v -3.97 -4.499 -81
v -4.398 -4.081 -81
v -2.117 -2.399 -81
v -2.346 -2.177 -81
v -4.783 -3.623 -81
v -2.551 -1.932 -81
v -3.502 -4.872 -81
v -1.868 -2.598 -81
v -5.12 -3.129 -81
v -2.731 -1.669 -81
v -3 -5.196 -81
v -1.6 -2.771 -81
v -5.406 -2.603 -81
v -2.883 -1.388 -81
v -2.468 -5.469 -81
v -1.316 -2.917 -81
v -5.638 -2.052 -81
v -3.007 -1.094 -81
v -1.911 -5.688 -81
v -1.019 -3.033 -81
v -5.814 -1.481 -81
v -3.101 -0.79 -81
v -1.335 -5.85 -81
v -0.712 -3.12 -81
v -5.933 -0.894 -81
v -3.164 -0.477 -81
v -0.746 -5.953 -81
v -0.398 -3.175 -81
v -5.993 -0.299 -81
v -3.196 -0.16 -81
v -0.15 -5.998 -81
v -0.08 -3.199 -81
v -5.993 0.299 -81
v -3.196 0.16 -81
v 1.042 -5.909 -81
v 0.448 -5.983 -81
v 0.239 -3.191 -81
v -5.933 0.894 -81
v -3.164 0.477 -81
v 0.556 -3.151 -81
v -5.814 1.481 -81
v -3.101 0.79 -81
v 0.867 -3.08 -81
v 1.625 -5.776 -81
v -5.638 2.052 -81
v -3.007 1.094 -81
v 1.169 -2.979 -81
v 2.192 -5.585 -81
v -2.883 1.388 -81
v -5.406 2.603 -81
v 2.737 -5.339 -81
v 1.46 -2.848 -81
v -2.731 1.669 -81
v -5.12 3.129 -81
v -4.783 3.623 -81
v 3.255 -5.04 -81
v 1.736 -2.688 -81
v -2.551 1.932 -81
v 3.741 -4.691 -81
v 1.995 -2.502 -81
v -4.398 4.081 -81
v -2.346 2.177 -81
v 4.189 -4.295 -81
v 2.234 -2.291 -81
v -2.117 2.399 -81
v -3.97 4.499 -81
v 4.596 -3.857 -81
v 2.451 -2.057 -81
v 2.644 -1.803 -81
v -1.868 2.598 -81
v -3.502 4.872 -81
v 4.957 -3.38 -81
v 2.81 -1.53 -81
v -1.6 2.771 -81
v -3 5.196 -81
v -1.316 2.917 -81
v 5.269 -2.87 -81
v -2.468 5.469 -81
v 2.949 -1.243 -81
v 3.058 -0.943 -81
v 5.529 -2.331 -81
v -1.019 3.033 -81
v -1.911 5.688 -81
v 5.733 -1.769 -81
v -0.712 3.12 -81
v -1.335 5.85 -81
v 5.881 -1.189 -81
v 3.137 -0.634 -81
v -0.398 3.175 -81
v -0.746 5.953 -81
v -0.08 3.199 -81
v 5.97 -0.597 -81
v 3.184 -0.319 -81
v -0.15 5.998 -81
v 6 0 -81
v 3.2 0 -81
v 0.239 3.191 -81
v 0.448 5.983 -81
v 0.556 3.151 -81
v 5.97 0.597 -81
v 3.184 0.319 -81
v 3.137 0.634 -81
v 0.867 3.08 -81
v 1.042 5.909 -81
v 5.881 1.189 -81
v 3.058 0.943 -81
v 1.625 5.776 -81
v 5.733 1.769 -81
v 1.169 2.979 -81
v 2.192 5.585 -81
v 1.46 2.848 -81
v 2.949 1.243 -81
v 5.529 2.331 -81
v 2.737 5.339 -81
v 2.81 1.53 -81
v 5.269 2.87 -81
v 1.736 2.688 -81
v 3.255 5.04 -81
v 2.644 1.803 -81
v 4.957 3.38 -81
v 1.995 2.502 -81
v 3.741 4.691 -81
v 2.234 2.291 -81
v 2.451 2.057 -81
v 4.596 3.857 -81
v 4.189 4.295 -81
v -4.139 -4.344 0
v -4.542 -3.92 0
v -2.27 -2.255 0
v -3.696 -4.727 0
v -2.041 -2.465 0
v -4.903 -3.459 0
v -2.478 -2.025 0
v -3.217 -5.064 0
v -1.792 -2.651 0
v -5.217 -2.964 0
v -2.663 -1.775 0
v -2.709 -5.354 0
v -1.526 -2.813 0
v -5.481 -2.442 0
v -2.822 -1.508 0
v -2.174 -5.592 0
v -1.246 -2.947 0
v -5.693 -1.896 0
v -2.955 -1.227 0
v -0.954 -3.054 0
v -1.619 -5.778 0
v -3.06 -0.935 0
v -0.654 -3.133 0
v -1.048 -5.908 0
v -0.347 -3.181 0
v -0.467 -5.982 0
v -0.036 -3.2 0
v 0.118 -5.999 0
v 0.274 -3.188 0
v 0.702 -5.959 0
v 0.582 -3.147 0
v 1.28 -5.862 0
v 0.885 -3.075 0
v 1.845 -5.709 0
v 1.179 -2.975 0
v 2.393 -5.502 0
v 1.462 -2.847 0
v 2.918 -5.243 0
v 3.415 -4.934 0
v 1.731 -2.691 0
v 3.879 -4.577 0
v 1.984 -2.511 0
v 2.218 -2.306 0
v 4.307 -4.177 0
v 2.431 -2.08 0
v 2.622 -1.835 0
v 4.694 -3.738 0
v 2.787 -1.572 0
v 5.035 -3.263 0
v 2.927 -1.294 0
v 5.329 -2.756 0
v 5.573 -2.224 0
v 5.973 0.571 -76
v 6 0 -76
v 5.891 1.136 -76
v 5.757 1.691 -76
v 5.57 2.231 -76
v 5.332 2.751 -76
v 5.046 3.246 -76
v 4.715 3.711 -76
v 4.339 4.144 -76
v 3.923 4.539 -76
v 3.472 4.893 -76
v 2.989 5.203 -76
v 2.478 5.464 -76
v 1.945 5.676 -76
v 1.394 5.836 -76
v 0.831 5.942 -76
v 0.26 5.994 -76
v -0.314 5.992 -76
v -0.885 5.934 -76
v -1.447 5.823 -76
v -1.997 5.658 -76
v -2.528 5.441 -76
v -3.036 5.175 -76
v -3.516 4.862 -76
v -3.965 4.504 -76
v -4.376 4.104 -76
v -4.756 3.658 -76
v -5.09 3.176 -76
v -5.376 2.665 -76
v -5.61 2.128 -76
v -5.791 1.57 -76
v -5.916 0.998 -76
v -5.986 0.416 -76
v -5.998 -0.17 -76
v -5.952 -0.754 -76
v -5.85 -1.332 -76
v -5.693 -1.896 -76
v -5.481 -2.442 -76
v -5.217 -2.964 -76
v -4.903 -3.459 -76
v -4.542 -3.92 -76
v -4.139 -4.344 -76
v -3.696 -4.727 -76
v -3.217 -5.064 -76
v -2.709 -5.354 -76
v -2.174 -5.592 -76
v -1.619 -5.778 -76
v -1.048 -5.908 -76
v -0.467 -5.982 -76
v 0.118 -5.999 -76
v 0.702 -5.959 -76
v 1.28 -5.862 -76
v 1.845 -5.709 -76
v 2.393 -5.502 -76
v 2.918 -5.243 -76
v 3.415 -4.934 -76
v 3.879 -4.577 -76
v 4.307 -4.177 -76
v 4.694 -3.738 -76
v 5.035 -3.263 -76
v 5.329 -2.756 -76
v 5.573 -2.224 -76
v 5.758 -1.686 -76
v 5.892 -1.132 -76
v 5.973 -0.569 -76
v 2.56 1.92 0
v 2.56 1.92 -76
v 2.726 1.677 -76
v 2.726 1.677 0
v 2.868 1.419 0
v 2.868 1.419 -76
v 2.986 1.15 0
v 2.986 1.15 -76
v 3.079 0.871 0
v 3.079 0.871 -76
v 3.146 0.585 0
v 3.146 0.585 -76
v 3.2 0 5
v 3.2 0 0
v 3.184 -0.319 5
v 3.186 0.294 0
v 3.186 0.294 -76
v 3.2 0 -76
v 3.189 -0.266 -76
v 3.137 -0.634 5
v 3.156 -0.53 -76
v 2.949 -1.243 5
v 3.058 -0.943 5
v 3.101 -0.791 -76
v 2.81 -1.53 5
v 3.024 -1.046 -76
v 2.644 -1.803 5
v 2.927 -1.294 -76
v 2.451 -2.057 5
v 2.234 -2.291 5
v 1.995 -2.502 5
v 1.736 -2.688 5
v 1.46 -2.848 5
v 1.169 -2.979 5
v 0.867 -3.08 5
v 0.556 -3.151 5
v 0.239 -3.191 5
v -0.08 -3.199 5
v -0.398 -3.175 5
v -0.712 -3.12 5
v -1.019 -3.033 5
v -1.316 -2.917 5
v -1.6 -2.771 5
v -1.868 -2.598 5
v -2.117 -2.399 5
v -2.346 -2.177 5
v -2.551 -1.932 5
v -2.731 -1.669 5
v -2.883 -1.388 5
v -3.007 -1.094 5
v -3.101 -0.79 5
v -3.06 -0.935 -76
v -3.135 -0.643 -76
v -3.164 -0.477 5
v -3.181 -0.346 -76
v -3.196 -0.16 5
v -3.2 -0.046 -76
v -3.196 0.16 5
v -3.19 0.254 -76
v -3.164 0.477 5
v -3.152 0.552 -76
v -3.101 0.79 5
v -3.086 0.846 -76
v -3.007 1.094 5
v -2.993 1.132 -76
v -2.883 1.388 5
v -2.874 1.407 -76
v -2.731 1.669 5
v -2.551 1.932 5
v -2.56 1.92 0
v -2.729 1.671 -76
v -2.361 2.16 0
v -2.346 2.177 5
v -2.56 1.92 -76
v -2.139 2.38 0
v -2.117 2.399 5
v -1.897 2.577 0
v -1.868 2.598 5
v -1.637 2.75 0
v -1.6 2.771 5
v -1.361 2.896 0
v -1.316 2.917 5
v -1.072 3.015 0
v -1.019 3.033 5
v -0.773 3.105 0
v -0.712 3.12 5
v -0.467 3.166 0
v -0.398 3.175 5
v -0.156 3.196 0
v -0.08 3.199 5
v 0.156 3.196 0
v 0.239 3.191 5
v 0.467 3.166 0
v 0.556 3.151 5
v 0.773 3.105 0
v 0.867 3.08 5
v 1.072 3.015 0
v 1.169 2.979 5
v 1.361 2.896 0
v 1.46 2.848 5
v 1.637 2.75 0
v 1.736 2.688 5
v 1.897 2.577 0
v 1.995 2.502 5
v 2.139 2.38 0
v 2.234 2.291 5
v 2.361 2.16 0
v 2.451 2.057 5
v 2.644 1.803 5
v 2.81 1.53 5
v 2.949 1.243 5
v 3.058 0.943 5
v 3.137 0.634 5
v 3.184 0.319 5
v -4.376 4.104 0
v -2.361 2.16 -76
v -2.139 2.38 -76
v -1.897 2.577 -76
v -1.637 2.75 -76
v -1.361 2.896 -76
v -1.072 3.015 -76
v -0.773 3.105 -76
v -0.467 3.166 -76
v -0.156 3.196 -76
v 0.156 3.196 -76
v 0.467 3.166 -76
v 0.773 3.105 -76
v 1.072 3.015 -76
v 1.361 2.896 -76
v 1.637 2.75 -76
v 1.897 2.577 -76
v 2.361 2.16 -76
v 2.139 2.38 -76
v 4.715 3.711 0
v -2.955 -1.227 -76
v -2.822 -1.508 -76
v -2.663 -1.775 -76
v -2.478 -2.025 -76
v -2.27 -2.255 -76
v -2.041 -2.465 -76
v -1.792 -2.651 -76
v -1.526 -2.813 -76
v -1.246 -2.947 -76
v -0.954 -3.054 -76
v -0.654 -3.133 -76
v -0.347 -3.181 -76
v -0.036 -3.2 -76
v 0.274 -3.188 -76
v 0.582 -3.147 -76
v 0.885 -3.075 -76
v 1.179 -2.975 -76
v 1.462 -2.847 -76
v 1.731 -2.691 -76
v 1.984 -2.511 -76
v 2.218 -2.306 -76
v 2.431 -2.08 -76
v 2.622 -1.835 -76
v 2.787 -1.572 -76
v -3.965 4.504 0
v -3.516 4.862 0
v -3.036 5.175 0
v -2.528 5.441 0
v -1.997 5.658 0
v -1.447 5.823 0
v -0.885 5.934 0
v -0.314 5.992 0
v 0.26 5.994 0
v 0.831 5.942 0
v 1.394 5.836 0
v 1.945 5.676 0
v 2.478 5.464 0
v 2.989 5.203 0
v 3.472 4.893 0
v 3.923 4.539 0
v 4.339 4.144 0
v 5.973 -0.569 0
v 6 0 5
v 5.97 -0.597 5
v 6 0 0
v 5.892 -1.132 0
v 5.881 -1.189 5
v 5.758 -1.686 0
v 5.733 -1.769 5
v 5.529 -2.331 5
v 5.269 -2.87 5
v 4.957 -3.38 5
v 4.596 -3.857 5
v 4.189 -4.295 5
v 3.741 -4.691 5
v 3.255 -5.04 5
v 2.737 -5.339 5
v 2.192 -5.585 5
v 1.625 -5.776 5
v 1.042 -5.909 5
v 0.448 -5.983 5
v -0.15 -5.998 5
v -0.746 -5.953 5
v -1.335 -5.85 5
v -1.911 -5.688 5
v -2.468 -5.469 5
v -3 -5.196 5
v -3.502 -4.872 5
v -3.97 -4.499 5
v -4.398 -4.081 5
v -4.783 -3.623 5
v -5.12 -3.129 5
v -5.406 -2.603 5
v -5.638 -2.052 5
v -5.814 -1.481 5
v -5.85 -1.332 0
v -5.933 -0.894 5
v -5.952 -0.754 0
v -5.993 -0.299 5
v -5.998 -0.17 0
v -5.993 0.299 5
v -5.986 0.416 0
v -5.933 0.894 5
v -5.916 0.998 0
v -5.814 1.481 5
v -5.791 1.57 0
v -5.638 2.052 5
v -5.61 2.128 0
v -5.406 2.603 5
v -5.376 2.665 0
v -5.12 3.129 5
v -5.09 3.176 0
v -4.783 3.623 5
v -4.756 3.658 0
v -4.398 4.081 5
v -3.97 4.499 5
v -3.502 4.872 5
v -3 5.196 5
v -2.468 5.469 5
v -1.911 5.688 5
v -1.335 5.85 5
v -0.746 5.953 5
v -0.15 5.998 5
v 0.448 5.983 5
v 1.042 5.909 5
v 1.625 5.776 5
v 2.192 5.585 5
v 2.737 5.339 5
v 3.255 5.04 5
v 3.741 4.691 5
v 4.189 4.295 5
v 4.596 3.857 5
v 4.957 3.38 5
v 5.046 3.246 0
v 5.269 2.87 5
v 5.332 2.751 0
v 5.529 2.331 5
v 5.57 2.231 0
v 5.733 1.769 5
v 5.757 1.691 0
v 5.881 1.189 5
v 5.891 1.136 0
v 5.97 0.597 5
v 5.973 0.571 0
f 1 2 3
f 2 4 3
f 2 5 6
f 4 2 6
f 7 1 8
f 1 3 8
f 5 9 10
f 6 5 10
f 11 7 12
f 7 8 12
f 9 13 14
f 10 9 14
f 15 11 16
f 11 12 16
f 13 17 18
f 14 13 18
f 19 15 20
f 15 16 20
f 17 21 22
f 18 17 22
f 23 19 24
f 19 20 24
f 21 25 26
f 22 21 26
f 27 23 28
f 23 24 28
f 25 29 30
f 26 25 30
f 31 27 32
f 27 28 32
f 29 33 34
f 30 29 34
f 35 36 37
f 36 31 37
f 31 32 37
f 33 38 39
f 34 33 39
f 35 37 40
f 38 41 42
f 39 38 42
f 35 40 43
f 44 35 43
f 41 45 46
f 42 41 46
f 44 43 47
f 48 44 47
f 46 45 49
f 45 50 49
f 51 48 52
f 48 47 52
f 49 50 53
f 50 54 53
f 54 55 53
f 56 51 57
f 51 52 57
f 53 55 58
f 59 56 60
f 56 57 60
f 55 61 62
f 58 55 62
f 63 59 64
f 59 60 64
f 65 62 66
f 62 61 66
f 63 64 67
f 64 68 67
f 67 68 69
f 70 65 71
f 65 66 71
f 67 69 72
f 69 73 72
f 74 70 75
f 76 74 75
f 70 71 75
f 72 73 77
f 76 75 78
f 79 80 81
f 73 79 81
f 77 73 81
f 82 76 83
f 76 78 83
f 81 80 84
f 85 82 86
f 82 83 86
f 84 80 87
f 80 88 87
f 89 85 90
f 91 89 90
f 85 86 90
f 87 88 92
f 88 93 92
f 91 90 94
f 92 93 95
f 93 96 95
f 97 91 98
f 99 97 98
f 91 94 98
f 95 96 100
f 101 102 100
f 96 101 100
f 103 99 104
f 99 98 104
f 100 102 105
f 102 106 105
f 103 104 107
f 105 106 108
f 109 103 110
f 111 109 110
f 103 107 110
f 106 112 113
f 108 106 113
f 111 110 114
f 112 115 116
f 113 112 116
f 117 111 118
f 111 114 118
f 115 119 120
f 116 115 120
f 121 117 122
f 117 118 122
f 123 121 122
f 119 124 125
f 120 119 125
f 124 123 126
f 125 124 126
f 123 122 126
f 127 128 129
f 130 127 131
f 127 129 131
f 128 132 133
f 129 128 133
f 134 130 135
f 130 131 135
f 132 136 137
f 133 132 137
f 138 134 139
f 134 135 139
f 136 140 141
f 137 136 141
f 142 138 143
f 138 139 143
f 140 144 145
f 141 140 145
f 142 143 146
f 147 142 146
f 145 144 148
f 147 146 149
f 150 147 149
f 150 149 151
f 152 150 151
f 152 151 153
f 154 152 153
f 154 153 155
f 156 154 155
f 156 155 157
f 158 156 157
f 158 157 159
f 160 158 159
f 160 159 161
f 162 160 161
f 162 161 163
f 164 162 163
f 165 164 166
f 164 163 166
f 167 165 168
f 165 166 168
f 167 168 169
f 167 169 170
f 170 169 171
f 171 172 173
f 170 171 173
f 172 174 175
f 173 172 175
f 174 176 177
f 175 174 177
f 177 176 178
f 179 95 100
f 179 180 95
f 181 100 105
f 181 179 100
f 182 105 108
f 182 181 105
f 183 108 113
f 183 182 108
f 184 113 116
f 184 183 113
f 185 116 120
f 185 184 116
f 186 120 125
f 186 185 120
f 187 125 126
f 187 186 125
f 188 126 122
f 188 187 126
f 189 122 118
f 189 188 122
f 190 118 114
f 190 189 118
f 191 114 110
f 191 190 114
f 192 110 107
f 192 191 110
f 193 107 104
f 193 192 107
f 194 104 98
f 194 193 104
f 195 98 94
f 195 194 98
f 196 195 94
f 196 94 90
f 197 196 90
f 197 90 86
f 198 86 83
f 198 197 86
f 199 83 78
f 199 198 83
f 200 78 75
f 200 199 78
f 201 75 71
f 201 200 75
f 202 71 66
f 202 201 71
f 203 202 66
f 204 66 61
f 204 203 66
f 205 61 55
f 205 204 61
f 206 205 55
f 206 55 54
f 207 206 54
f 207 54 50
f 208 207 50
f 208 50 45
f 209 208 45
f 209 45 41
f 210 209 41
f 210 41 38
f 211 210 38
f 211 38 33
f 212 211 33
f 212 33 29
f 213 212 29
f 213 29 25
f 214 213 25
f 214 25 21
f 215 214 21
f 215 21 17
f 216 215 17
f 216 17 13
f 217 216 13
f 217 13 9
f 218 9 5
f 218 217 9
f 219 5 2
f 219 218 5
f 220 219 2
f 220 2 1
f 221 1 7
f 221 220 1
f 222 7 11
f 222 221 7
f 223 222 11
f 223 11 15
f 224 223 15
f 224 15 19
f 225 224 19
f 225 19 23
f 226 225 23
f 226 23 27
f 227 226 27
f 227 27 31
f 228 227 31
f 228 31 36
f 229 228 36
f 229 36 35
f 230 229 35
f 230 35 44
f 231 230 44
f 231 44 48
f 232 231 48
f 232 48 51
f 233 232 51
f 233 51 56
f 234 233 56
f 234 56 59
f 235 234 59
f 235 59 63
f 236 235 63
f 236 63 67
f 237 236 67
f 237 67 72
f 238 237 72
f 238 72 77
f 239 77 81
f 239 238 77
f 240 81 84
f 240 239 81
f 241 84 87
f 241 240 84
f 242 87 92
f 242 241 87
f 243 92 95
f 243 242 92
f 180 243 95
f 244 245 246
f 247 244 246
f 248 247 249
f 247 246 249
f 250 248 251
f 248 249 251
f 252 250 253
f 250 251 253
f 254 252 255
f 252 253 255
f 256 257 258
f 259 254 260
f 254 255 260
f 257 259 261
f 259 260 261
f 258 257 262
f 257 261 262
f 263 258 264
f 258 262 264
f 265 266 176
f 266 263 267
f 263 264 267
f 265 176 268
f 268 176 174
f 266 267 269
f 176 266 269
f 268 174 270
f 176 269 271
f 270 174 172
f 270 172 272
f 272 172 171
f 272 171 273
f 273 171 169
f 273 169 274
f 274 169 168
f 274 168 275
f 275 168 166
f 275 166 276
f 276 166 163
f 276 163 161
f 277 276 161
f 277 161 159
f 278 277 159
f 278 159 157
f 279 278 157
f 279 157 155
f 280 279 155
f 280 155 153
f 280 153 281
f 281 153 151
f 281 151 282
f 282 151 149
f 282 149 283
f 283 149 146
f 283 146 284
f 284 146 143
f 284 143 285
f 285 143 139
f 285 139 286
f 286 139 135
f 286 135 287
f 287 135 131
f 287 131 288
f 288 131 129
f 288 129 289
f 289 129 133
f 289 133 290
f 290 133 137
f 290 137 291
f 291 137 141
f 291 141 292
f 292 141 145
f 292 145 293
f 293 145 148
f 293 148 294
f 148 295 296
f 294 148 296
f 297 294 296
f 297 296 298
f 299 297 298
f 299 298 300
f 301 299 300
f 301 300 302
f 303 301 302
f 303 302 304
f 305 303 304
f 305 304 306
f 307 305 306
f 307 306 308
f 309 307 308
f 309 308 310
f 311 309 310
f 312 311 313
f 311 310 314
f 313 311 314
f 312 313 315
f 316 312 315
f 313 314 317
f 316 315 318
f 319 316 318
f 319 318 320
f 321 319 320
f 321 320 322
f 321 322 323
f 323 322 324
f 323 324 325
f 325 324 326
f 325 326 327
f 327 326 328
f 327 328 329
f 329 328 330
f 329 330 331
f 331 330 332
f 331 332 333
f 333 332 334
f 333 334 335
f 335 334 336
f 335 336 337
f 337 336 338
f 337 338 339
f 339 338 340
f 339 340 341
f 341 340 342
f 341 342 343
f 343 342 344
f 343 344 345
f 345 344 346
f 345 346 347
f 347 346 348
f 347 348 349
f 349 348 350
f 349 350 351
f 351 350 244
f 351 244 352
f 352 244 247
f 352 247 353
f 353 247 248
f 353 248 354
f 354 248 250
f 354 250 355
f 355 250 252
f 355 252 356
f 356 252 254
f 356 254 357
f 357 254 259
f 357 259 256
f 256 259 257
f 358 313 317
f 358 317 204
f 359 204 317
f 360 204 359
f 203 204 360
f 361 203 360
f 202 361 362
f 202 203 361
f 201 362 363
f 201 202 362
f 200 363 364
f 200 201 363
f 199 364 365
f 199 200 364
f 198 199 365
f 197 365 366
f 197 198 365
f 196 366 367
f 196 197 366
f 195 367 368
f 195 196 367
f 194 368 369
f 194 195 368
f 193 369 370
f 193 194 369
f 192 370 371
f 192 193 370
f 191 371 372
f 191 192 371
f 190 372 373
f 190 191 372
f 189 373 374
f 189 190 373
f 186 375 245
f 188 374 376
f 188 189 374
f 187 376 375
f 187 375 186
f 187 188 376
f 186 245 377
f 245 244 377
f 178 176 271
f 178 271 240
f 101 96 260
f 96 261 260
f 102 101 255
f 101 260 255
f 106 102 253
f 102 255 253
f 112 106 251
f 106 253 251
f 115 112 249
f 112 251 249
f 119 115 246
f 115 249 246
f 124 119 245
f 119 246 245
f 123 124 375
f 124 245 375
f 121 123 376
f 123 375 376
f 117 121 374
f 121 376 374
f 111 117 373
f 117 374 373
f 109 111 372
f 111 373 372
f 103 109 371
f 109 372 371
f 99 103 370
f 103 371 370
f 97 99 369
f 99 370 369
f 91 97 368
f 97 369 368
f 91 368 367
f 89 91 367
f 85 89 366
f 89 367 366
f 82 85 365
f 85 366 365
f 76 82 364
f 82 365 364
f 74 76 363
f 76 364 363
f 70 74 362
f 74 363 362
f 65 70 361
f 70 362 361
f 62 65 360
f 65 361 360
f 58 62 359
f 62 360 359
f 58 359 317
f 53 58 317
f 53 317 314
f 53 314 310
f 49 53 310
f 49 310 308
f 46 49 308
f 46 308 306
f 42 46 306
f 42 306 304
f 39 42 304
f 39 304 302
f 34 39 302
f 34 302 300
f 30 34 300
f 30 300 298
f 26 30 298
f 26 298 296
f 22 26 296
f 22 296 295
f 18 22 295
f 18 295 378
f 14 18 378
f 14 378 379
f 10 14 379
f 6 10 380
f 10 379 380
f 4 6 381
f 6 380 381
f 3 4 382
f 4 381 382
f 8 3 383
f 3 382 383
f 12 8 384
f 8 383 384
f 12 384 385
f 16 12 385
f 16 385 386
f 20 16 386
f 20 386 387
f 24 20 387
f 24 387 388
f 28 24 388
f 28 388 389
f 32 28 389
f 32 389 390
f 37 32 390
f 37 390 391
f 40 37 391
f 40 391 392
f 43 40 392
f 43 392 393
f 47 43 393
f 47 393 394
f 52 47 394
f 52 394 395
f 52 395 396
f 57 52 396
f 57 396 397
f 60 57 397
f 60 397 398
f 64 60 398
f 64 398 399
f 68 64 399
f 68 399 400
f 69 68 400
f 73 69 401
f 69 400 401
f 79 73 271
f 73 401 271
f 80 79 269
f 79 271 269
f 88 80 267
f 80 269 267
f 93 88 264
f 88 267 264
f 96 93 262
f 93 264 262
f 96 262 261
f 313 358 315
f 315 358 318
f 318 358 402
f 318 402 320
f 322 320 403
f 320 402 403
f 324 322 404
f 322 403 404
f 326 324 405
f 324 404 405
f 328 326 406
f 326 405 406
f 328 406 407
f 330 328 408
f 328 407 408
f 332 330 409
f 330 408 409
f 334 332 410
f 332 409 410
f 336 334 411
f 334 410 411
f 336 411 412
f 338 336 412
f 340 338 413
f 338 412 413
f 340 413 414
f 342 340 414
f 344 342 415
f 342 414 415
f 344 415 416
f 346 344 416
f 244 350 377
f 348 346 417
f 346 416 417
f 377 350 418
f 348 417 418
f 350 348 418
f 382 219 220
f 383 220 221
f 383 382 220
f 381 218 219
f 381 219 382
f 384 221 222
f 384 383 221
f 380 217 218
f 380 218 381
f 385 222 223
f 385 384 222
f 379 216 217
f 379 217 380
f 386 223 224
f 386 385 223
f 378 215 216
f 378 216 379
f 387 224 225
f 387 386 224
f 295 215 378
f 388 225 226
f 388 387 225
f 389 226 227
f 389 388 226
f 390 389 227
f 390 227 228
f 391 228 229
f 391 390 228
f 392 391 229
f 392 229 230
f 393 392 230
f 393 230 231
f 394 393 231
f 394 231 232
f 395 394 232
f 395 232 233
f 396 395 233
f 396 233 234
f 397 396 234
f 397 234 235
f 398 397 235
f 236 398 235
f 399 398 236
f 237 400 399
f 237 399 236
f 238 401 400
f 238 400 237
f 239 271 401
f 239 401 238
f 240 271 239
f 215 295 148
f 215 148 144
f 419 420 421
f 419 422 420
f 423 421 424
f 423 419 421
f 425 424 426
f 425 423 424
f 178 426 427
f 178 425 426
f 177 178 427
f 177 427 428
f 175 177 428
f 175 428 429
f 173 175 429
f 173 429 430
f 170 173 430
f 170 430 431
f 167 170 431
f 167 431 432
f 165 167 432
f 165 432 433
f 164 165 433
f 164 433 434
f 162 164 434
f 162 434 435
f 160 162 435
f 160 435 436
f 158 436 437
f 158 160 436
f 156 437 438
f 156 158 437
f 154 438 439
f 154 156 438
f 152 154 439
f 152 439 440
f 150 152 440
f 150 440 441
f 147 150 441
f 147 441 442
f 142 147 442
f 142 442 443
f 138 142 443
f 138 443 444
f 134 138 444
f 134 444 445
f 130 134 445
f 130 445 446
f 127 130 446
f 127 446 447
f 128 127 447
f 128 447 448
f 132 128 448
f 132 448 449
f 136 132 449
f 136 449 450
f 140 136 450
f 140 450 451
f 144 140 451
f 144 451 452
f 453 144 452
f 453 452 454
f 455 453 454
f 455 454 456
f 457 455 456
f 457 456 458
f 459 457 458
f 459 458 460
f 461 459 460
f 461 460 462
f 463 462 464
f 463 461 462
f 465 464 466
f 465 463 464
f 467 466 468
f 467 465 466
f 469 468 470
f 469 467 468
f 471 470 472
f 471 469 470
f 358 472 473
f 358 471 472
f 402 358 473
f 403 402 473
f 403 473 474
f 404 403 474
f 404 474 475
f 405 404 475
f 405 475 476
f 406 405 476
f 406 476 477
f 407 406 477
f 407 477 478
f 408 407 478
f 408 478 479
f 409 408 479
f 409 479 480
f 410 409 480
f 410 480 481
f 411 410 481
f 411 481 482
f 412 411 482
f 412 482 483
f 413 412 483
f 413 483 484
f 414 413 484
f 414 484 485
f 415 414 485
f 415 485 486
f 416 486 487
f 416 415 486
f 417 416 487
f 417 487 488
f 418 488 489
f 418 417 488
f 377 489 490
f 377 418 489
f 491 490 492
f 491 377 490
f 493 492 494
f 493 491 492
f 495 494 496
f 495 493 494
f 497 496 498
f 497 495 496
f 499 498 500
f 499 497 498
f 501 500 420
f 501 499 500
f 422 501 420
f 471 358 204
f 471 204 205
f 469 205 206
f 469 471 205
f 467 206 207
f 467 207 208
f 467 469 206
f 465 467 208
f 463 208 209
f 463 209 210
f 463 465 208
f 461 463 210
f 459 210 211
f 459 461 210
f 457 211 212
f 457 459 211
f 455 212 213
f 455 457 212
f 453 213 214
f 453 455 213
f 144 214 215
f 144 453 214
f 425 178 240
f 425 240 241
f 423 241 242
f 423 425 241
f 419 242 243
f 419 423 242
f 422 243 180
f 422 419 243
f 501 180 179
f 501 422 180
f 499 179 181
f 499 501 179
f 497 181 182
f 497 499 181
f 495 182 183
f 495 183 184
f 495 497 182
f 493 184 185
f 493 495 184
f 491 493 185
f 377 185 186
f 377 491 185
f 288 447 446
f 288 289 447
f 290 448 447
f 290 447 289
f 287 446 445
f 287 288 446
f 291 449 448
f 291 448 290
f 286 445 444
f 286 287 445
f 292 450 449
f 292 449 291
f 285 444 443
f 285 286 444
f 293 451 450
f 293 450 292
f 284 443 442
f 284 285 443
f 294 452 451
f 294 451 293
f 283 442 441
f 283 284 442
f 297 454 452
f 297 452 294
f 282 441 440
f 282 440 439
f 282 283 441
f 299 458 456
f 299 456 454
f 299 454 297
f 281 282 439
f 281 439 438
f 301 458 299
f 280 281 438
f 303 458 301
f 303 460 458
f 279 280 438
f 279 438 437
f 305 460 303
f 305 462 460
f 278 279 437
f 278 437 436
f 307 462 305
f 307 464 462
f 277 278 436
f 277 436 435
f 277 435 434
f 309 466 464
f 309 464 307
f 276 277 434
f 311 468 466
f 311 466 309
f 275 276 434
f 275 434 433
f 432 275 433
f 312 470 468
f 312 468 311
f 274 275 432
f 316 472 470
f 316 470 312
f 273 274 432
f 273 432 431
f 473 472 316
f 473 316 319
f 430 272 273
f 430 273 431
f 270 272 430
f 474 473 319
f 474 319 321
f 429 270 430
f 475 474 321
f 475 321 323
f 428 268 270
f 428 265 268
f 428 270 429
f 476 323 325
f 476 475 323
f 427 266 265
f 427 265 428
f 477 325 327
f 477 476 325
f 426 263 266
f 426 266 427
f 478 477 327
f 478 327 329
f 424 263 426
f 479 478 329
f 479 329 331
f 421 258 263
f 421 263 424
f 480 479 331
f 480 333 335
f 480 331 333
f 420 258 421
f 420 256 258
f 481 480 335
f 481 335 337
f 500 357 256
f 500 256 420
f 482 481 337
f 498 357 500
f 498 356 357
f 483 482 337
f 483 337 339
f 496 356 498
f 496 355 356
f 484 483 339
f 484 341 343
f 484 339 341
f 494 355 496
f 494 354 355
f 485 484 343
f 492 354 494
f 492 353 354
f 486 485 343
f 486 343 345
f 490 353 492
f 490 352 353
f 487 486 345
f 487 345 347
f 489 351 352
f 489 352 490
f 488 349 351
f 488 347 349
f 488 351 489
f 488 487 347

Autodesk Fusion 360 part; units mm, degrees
sketch "Sketch1" plane through (0, 0, 0) normal (0, 0, 1) x (1, 0, 0)
  circle A0 centre (0, 0) radius 3.2
  circle A1 centre (0, 0) radius 6
  line L0 (-3.0605, -0.9346) -> (-5.6926, -1.8959)
  line L1 (-2.5603, 1.9196) -> (-4.3765, 4.1044)
  line L2 (2.5603, 1.9196) -> (4.7149, 3.7108)
  line L3 (2.9267, -1.2939) -> (5.5727, -2.2237)
  dimension "d1" = 6.4
  dimension "d2" = 12
extrude "Extrude1" add sketch "Sketch1" along normal blind 5 contours A0 A1 L2 L3 | A0 A1 L1 L2 | A0 A1 L0 L3 | A0 A1 L0 L1
extrude "Extrude2" add sketch "Sketch1" against normal blind 76 contours A0 A1 L2 L3 | A0 A1 L0 L1
extrude "Extrude3" add sketch "Sketch1" against normal blind 5 from surface at -76 contours A0 A1 L2 L3 | A0 A1 L1 L2 | A0 A1 L0 L3 | A0 A1 L0 L1
